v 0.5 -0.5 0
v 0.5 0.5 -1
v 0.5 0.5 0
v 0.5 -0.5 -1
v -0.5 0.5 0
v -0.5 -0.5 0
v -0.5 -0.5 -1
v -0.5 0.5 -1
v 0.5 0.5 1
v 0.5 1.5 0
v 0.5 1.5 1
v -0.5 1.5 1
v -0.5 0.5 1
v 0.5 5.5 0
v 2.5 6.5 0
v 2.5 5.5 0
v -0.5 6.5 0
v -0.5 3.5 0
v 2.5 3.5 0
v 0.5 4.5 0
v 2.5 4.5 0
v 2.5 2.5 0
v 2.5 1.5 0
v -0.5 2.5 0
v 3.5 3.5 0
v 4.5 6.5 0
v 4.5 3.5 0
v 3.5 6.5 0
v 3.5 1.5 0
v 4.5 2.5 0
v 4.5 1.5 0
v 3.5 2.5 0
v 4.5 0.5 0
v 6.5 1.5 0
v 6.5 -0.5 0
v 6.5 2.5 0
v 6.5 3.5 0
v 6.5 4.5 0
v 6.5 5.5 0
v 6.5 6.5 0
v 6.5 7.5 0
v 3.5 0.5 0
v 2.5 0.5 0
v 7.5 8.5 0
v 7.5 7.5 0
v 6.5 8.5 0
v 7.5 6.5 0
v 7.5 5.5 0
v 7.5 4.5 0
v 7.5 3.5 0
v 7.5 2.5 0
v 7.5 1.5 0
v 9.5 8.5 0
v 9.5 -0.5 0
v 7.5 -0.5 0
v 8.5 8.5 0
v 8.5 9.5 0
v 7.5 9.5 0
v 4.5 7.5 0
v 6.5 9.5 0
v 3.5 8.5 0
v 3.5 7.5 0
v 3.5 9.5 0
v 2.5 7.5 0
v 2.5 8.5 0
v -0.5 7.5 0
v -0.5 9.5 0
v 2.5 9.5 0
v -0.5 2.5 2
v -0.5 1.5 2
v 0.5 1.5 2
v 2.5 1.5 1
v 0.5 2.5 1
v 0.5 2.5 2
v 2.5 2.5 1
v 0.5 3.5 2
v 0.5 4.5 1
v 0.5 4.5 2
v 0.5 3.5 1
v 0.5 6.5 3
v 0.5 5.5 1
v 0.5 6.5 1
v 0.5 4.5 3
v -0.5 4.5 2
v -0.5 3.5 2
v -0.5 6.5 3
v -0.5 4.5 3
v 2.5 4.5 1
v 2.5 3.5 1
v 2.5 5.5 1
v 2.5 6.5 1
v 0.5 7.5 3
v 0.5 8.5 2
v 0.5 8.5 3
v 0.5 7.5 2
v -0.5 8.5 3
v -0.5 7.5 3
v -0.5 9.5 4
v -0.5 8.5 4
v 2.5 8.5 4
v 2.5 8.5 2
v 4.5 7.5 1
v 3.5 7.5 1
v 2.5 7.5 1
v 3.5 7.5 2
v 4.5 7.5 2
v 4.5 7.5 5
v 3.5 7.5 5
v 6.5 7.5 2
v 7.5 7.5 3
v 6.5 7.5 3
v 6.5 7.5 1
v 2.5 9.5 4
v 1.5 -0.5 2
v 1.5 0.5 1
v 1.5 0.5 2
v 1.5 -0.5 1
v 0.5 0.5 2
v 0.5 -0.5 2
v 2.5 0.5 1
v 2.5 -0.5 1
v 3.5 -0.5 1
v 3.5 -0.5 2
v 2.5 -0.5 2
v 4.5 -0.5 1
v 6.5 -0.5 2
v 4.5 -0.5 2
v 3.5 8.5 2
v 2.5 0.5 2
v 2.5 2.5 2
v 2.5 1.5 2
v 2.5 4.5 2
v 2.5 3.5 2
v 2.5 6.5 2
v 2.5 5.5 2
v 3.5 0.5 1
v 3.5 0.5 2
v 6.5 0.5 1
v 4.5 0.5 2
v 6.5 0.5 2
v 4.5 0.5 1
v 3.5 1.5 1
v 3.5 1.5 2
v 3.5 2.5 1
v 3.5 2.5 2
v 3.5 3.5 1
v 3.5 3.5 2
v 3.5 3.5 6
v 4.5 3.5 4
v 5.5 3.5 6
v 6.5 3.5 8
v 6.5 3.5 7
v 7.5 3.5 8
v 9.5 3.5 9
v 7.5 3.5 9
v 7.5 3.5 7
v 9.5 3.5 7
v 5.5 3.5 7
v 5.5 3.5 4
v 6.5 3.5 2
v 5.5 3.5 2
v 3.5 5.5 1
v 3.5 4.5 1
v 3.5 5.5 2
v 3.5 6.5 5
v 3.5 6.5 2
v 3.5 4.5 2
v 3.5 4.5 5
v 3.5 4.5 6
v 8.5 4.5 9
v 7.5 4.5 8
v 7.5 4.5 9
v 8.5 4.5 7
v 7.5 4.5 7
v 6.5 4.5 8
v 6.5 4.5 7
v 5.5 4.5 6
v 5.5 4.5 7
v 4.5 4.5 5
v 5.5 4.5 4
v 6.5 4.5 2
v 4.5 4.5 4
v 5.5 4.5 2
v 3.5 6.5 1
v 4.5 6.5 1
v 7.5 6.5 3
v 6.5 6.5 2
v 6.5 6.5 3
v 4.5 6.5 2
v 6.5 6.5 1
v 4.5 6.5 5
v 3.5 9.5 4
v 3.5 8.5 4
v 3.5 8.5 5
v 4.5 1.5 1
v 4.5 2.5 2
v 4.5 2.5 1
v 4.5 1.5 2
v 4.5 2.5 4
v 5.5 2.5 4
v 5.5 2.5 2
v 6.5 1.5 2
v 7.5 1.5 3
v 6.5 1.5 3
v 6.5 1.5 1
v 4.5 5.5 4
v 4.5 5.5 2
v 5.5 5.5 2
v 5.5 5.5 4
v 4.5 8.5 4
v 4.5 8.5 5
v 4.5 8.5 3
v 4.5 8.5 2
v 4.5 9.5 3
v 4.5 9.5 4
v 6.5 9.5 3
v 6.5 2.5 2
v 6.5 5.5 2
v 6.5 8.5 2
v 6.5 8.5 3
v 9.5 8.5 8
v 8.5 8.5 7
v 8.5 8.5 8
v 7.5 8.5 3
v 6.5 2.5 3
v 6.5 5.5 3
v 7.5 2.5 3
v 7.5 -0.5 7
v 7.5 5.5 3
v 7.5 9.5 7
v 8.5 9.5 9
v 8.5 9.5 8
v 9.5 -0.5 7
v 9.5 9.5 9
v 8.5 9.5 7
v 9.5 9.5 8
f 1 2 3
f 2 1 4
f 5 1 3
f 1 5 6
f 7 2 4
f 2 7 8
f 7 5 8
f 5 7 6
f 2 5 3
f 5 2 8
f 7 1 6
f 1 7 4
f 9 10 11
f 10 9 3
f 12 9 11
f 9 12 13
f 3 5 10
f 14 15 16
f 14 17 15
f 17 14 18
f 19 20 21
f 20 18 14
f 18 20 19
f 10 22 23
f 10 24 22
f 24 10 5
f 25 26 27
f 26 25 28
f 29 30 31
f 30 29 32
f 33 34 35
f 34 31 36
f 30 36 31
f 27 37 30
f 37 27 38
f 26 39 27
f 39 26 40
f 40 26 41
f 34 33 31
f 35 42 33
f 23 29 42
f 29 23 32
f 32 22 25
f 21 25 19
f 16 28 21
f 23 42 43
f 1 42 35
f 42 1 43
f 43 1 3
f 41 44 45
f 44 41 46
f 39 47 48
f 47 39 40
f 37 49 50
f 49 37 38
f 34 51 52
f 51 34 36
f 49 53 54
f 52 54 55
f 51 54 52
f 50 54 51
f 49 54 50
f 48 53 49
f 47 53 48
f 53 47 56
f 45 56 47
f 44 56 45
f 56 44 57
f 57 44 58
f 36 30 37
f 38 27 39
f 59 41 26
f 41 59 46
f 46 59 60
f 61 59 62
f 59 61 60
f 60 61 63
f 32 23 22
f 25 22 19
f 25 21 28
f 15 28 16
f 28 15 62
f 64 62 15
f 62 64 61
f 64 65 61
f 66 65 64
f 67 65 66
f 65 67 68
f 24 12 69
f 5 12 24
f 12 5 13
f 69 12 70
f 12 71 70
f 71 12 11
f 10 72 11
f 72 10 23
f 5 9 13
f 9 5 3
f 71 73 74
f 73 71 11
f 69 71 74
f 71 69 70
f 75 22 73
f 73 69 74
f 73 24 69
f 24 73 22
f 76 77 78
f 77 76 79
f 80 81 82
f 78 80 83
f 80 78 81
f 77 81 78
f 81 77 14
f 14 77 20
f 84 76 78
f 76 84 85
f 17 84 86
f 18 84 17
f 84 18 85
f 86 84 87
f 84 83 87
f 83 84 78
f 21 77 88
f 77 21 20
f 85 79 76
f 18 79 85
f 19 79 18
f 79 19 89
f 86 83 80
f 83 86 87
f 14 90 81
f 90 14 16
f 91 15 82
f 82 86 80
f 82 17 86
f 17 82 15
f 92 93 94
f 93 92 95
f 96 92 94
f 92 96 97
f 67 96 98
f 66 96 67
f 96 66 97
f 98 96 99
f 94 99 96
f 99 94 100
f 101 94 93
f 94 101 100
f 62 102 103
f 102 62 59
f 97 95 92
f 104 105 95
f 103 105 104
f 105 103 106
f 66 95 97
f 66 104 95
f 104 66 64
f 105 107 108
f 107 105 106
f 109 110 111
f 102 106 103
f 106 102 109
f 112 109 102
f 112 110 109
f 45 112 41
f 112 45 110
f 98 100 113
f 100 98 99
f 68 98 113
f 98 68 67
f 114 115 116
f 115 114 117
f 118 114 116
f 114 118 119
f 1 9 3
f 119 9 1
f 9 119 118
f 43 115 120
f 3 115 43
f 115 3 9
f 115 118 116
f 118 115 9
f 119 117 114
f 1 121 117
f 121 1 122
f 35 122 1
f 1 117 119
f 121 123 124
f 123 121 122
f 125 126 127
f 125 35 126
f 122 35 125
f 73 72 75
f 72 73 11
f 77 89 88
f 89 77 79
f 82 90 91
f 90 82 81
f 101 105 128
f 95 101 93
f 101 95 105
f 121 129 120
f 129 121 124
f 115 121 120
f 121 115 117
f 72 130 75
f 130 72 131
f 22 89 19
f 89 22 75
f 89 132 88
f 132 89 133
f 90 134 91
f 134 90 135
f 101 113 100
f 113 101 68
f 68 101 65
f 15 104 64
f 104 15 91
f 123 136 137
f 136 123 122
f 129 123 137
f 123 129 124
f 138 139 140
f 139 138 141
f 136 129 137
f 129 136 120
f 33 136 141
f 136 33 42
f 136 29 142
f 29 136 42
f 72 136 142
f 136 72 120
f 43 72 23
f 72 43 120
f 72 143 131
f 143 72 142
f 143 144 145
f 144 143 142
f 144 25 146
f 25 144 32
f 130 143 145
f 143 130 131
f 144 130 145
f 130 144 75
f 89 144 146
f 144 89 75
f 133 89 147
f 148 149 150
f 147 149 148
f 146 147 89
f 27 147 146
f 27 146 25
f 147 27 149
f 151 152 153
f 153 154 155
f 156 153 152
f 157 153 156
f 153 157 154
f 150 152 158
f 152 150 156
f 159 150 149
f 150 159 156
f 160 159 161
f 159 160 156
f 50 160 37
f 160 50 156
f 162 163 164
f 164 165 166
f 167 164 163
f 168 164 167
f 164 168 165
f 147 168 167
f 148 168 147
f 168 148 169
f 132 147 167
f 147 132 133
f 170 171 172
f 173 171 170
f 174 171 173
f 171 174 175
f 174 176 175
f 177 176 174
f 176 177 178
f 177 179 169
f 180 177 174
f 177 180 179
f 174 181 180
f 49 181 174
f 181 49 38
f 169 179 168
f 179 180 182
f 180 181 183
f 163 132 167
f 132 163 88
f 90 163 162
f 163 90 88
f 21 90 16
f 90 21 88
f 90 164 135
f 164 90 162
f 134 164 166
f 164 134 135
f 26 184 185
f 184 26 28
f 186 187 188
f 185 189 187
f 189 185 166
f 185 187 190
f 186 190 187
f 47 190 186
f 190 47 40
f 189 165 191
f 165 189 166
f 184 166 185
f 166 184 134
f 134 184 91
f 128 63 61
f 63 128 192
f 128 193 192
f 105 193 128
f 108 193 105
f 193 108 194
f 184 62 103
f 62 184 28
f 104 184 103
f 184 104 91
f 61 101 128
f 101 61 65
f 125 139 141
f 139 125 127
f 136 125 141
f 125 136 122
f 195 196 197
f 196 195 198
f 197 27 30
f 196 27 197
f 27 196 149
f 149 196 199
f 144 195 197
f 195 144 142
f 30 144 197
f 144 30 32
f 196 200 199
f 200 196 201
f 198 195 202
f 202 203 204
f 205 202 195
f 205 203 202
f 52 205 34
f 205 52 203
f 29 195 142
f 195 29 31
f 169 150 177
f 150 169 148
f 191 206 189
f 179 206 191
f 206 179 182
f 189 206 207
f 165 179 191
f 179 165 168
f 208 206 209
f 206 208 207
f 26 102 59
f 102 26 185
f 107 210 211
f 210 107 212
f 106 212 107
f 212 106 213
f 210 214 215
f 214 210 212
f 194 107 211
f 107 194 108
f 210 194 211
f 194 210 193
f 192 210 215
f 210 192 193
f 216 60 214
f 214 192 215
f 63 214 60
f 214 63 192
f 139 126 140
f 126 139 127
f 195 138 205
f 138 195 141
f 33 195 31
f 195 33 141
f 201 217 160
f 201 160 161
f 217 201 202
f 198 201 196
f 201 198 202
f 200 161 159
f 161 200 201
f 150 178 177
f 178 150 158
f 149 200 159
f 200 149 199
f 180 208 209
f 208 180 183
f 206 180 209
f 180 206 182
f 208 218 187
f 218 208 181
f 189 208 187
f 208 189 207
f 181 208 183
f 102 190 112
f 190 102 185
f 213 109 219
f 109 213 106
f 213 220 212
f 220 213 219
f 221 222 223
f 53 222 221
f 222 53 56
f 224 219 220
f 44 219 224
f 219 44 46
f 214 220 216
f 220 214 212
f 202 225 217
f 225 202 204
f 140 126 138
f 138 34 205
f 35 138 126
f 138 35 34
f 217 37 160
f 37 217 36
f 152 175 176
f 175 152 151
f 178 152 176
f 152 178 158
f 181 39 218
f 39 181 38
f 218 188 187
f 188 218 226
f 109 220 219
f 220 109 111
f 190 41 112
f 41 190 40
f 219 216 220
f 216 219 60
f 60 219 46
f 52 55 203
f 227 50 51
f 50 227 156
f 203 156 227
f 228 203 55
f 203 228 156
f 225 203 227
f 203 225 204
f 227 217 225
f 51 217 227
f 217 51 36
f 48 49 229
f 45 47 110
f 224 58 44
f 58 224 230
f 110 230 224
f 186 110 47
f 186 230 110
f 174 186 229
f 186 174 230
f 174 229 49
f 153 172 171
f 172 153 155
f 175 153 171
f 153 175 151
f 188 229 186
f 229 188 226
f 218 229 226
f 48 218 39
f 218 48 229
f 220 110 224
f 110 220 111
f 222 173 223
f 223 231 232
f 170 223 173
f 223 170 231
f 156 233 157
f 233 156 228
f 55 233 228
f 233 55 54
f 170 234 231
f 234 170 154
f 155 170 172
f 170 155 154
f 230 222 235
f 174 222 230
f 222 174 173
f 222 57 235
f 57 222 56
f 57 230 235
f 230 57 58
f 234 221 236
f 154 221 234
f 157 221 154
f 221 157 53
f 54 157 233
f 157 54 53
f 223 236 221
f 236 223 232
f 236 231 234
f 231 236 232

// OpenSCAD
union() {
    translate([0, 0, -0.5]) color([1, 0, 0]) cube([1, 1, 1], center=true);
    translate([0, 1, 0.5]) cube([1, 1, 1], center=true);
    translate([0, 2, 1.0]) cube([1, 1, 2], center=true);
    translate([0, 4, 1.0]) cube([1, 1, 2], center=true);
    translate([0, 5, 1.5]) cube([1, 1, 3], center=true);
    translate([0, 6, 1.5]) cube([1, 1, 3], center=true);
    translate([0, 8, 1.5]) cube([1, 1, 3], center=true);
    translate([0, 9, 2.0]) cube([1, 1, 4], center=true);
    translate([1, 0, 1.0]) cube([1, 1, 2], center=true);
    translate([1, 2, 0.5]) cube([1, 1, 1], center=true);
    translate([1, 4, 0.5]) cube([1, 1, 1], center=true);
    translate([1, 6, 0.5]) cube([1, 1, 1], center=true);
    translate([1, 8, 1.0]) cube([1, 1, 2], center=true);
    translate([1, 9, 2.0]) cube([1, 1, 4], center=true);
    translate([2, 0, 0.5]) cube([1, 1, 1], center=true);
    translate([2, 2, 0.5]) cube([1, 1, 1], center=true);
    translate([2, 4, 0.5]) cube([1, 1, 1], center=true);
    translate([2, 6, 0.5]) cube([1, 1, 1], center=true);
    translate([2, 8, 1.0]) cube([1, 1, 2], center=true);
    translate([2, 9, 2.0]) cube([1, 1, 4], center=true);
    translate([3, 0, 1.0]) cube([1, 1, 2], center=true);
    translate([3, 1, 0.5]) cube([1, 1, 1], center=true);
    translate([3, 2, 1.0]) cube([1, 1, 2], center=true);
    translate([3, 3, 0.5]) cube([1, 1, 1], center=true);
    translate([3, 4, 1.0]) cube([1, 1, 2], center=true);
    translate([3, 5, 0.5]) cube([1, 1, 1], center=true);
    translate([3, 6, 1.0]) cube([1, 1, 2], center=true);
    translate([3, 7, 0.5]) cube([1, 1, 1], center=true);
    translate([3, 8, 1.0]) cube([1, 1, 2], center=true);
    translate([4, 0, 0.5]) cube([1, 1, 1], center=true);
    translate([4, 2, 0.5]) cube([1, 1, 1], center=true);
    translate([4, 4, 3.0]) cube([1, 1, 6], center=true);
    translate([4, 5, 2.5]) cube([1, 1, 5], center=true);
    translate([4, 6, 2.5]) cube([1, 1, 5], center=true);
    translate([4, 8, 2.5]) cube([1, 1, 5], center=true);
    translate([4, 9, 2.0]) cube([1, 1, 4], center=true);
    translate([5, 0, 1.0]) cube([1, 1, 2], center=true);
    translate([5, 1, 0.5]) cube([1, 1, 1], center=true);
    translate([5, 2, 1.0]) cube([1, 1, 2], center=true);
    translate([5, 3, 2.0]) cube([1, 1, 4], center=true);
    translate([5, 4, 3.0]) cube([1, 1, 6], center=true);
    translate([5, 5, 2.0]) cube([1, 1, 4], center=true);
    translate([5, 6, 1.0]) cube([1, 1, 2], center=true);
    translate([5, 7, 0.5]) cube([1, 1, 1], center=true);
    translate([5, 8, 1.0]) cube([1, 1, 2], center=true);
    translate([5, 9, 1.5]) cube([1, 1, 3], center=true);
    translate([6, 0, 1.0]) cube([1, 1, 2], center=true);
    translate([6, 1, 0.5]) cube([1, 1, 1], center=true);
    translate([6, 2, 1.0]) cube([1, 1, 2], center=true);
    translate([6, 3, 1.0]) cube([1, 1, 2], center=true);
    translate([6, 4, 3.5]) cube([1, 1, 7], center=true);
    translate([6, 5, 1.0]) cube([1, 1, 2], center=true);
    translate([6, 6, 1.0]) cube([1, 1, 2], center=true);
    translate([6, 7, 0.5]) cube([1, 1, 1], center=true);
    translate([6, 8, 1.0]) cube([1, 1, 2], center=true);
    translate([6, 9, 1.5]) cube([1, 1, 3], center=true);
    translate([7, 2, 1.5]) cube([1, 1, 3], center=true);
    translate([7, 4, 4.0]) cube([1, 1, 8], center=true);
    translate([7, 6, 1.5]) cube([1, 1, 3], center=true);
    translate([7, 8, 1.5]) cube([1, 1, 3], center=true);
    translate([8, 0, 3.5]) cube([1, 1, 7], center=true);
    translate([8, 1, 3.5]) cube([1, 1, 7], center=true);
    translate([8, 2, 3.5]) cube([1, 1, 7], center=true);
    translate([8, 3, 3.5]) cube([1, 1, 7], center=true);
    translate([8, 4, 4.5]) cube([1, 1, 9], center=true);
    translate([8, 5, 3.5]) cube([1, 1, 7], center=true);
    translate([8, 6, 3.5]) cube([1, 1, 7], center=true);
    translate([8, 7, 3.5]) cube([1, 1, 7], center=true);
    translate([8, 8, 3.5]) cube([1, 1, 7], center=true);
    translate([8, 9, 3.5]) cube([1, 1, 7], center=true);
    translate([9, 0, 3.5]) cube([1, 1, 7], center=true);
    translate([9, 1, 3.5]) cube([1, 1, 7], center=true);
    translate([9, 2, 3.5]) cube([1, 1, 7], center=true);
    translate([9, 3, 3.5]) cube([1, 1, 7], center=true);
    translate([9, 4, 4.5]) cube([1, 1, 9], center=true);
    translate([9, 5, 4.5]) cube([1, 1, 9], center=true);
    translate([9, 6, 4.5]) cube([1, 1, 9], center=true);
    translate([9, 7, 4.5]) cube([1, 1, 9], center=true);
    translate([9, 8, 4.5]) cube([1, 1, 9], center=true);
    translate([9, 9, 8.5]) color([0, 0, 1]) cube([1, 1, 1], center=true);
}
